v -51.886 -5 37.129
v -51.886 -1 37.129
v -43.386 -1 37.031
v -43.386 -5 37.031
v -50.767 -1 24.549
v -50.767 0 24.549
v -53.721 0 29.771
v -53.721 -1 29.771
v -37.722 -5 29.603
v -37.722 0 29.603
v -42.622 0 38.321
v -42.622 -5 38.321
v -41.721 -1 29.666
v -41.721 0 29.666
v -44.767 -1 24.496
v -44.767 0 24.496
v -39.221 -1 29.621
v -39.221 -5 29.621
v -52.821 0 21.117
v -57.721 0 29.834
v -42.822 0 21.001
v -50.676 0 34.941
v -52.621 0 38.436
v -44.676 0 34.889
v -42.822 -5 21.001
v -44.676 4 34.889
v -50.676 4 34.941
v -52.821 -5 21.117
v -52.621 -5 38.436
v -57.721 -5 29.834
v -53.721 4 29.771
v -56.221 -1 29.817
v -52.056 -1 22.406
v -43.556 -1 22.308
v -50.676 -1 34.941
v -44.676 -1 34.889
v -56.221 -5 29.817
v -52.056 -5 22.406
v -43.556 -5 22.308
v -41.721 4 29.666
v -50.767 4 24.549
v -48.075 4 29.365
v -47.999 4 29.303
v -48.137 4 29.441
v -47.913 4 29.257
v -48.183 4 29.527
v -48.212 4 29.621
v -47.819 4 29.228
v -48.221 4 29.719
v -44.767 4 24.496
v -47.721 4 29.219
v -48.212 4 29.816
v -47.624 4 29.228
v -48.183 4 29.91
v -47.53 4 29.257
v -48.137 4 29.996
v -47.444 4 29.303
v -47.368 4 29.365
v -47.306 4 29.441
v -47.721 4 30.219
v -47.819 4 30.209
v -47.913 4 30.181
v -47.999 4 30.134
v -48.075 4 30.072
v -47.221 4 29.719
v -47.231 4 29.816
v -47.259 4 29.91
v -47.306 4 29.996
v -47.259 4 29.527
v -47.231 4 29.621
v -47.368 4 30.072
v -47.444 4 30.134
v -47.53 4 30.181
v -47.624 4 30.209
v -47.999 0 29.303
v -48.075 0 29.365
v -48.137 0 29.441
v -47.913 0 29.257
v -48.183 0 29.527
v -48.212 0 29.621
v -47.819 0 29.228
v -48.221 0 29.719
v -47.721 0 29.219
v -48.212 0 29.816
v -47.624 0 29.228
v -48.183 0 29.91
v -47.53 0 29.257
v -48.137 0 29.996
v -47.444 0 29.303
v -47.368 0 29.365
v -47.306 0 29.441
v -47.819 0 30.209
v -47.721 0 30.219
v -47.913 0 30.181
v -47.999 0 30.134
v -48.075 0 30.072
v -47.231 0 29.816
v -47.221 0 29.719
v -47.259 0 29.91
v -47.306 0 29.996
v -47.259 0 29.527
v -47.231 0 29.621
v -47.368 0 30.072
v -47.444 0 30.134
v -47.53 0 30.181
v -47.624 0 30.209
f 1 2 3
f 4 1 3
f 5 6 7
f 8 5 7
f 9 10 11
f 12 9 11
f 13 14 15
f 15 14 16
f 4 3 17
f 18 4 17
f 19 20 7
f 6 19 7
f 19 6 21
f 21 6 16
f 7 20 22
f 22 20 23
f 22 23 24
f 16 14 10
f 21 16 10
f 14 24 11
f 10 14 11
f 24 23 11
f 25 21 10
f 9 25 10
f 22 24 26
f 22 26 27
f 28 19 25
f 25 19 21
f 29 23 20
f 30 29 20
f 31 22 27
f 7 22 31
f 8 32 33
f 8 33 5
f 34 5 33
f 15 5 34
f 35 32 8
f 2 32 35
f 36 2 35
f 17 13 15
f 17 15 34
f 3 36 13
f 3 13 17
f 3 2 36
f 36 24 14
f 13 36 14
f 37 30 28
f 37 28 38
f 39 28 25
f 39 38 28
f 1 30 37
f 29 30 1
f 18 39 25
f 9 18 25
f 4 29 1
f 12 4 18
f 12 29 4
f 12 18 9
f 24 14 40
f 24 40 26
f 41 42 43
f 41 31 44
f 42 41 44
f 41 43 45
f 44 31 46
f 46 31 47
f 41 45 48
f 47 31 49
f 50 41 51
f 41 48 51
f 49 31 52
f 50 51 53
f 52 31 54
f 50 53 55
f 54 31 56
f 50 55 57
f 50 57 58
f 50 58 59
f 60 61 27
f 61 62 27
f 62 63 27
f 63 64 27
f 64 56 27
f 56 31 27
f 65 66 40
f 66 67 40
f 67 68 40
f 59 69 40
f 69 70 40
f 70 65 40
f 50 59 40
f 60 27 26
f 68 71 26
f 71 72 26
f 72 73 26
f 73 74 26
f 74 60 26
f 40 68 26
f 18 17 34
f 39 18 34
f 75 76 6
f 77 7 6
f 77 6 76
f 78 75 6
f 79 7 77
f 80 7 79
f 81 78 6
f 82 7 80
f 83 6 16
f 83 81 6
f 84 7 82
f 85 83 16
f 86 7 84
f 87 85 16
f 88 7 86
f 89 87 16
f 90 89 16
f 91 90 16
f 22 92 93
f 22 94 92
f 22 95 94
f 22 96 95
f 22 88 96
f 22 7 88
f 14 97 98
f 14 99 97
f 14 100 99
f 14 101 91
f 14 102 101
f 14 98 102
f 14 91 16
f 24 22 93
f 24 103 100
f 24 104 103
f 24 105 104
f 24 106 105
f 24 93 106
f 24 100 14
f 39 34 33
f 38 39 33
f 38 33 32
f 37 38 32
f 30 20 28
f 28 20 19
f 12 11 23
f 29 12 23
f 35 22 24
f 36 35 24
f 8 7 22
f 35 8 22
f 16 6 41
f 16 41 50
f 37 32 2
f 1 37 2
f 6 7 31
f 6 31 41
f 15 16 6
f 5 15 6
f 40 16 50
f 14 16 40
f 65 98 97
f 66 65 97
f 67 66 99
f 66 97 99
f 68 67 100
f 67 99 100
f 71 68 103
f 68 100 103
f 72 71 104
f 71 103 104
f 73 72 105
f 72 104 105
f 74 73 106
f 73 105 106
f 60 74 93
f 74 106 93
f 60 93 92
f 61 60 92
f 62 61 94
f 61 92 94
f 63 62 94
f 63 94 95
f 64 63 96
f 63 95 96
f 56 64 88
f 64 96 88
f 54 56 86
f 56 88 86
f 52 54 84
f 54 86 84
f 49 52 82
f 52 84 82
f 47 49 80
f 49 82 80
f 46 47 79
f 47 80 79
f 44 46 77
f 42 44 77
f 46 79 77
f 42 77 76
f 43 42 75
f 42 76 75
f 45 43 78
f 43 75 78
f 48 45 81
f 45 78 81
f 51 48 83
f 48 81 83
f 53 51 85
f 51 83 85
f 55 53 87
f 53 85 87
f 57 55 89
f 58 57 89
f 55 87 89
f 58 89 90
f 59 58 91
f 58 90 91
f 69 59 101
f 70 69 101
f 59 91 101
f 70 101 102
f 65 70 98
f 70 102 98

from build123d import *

# Parameters (mm, degrees)
F1_DEPTH = 5
F2_DEPTH = 1
F0_R     = 0.5
F3_DEPTH = 4


with BuildPart() as f1:
    # F0 (on Front) → F1 (new body)
    with BuildSketch(Plane.XZ):
        Polygon((-42.821645, 21.0013), (-37.722063, 29.603292), (-42.621815, 38.320655), (-52.621149, 38.436027), (-57.720732, 29.834036), (-52.820979, 21.116672), align=None)
        Polygon((-43.386464, 37.030843), (-39.221397, 29.620591), (-43.556331, 22.308411), (-52.056331, 22.406484), (-56.221397, 29.816736), (-51.886464, 37.128916), align=None, mode=Mode.SUBTRACT)
    extrude(amount=F1_DEPTH)

    # F0 (on Front) → F2 (join)
    with BuildSketch(Plane.XZ):
        Polygon((-43.556331, 22.308411), (-39.221397, 29.620591), (-43.386464, 37.030843), (-51.886464, 37.128916), (-56.221397, 29.816736), (-52.056331, 22.406484), align=None)
        Polygon((-44.675878, 34.888535), (-41.721397, 29.666102), (-44.766917, 24.49623), (-50.766917, 24.548792), (-53.721397, 29.771225), (-50.675878, 34.941097), align=None, mode=Mode.SUBTRACT)
    extrude(amount=F2_DEPTH)


with BuildPart() as f3:
    # F0 (on Front) → F3 (new body)
    with BuildSketch(Plane.XZ):
        Polygon((-44.766917, 24.49623), (-41.721397, 29.666102), (-44.675878, 34.888535), (-50.675878, 34.941097), (-53.721397, 29.771225), (-50.766917, 24.548792), align=None)
        with Locations((-47.721397, 29.718664)):
            Circle(F0_R, mode=Mode.SUBTRACT)
    extrude(amount=-F3_DEPTH)


solid = Compound([f1.part, f3.part])
